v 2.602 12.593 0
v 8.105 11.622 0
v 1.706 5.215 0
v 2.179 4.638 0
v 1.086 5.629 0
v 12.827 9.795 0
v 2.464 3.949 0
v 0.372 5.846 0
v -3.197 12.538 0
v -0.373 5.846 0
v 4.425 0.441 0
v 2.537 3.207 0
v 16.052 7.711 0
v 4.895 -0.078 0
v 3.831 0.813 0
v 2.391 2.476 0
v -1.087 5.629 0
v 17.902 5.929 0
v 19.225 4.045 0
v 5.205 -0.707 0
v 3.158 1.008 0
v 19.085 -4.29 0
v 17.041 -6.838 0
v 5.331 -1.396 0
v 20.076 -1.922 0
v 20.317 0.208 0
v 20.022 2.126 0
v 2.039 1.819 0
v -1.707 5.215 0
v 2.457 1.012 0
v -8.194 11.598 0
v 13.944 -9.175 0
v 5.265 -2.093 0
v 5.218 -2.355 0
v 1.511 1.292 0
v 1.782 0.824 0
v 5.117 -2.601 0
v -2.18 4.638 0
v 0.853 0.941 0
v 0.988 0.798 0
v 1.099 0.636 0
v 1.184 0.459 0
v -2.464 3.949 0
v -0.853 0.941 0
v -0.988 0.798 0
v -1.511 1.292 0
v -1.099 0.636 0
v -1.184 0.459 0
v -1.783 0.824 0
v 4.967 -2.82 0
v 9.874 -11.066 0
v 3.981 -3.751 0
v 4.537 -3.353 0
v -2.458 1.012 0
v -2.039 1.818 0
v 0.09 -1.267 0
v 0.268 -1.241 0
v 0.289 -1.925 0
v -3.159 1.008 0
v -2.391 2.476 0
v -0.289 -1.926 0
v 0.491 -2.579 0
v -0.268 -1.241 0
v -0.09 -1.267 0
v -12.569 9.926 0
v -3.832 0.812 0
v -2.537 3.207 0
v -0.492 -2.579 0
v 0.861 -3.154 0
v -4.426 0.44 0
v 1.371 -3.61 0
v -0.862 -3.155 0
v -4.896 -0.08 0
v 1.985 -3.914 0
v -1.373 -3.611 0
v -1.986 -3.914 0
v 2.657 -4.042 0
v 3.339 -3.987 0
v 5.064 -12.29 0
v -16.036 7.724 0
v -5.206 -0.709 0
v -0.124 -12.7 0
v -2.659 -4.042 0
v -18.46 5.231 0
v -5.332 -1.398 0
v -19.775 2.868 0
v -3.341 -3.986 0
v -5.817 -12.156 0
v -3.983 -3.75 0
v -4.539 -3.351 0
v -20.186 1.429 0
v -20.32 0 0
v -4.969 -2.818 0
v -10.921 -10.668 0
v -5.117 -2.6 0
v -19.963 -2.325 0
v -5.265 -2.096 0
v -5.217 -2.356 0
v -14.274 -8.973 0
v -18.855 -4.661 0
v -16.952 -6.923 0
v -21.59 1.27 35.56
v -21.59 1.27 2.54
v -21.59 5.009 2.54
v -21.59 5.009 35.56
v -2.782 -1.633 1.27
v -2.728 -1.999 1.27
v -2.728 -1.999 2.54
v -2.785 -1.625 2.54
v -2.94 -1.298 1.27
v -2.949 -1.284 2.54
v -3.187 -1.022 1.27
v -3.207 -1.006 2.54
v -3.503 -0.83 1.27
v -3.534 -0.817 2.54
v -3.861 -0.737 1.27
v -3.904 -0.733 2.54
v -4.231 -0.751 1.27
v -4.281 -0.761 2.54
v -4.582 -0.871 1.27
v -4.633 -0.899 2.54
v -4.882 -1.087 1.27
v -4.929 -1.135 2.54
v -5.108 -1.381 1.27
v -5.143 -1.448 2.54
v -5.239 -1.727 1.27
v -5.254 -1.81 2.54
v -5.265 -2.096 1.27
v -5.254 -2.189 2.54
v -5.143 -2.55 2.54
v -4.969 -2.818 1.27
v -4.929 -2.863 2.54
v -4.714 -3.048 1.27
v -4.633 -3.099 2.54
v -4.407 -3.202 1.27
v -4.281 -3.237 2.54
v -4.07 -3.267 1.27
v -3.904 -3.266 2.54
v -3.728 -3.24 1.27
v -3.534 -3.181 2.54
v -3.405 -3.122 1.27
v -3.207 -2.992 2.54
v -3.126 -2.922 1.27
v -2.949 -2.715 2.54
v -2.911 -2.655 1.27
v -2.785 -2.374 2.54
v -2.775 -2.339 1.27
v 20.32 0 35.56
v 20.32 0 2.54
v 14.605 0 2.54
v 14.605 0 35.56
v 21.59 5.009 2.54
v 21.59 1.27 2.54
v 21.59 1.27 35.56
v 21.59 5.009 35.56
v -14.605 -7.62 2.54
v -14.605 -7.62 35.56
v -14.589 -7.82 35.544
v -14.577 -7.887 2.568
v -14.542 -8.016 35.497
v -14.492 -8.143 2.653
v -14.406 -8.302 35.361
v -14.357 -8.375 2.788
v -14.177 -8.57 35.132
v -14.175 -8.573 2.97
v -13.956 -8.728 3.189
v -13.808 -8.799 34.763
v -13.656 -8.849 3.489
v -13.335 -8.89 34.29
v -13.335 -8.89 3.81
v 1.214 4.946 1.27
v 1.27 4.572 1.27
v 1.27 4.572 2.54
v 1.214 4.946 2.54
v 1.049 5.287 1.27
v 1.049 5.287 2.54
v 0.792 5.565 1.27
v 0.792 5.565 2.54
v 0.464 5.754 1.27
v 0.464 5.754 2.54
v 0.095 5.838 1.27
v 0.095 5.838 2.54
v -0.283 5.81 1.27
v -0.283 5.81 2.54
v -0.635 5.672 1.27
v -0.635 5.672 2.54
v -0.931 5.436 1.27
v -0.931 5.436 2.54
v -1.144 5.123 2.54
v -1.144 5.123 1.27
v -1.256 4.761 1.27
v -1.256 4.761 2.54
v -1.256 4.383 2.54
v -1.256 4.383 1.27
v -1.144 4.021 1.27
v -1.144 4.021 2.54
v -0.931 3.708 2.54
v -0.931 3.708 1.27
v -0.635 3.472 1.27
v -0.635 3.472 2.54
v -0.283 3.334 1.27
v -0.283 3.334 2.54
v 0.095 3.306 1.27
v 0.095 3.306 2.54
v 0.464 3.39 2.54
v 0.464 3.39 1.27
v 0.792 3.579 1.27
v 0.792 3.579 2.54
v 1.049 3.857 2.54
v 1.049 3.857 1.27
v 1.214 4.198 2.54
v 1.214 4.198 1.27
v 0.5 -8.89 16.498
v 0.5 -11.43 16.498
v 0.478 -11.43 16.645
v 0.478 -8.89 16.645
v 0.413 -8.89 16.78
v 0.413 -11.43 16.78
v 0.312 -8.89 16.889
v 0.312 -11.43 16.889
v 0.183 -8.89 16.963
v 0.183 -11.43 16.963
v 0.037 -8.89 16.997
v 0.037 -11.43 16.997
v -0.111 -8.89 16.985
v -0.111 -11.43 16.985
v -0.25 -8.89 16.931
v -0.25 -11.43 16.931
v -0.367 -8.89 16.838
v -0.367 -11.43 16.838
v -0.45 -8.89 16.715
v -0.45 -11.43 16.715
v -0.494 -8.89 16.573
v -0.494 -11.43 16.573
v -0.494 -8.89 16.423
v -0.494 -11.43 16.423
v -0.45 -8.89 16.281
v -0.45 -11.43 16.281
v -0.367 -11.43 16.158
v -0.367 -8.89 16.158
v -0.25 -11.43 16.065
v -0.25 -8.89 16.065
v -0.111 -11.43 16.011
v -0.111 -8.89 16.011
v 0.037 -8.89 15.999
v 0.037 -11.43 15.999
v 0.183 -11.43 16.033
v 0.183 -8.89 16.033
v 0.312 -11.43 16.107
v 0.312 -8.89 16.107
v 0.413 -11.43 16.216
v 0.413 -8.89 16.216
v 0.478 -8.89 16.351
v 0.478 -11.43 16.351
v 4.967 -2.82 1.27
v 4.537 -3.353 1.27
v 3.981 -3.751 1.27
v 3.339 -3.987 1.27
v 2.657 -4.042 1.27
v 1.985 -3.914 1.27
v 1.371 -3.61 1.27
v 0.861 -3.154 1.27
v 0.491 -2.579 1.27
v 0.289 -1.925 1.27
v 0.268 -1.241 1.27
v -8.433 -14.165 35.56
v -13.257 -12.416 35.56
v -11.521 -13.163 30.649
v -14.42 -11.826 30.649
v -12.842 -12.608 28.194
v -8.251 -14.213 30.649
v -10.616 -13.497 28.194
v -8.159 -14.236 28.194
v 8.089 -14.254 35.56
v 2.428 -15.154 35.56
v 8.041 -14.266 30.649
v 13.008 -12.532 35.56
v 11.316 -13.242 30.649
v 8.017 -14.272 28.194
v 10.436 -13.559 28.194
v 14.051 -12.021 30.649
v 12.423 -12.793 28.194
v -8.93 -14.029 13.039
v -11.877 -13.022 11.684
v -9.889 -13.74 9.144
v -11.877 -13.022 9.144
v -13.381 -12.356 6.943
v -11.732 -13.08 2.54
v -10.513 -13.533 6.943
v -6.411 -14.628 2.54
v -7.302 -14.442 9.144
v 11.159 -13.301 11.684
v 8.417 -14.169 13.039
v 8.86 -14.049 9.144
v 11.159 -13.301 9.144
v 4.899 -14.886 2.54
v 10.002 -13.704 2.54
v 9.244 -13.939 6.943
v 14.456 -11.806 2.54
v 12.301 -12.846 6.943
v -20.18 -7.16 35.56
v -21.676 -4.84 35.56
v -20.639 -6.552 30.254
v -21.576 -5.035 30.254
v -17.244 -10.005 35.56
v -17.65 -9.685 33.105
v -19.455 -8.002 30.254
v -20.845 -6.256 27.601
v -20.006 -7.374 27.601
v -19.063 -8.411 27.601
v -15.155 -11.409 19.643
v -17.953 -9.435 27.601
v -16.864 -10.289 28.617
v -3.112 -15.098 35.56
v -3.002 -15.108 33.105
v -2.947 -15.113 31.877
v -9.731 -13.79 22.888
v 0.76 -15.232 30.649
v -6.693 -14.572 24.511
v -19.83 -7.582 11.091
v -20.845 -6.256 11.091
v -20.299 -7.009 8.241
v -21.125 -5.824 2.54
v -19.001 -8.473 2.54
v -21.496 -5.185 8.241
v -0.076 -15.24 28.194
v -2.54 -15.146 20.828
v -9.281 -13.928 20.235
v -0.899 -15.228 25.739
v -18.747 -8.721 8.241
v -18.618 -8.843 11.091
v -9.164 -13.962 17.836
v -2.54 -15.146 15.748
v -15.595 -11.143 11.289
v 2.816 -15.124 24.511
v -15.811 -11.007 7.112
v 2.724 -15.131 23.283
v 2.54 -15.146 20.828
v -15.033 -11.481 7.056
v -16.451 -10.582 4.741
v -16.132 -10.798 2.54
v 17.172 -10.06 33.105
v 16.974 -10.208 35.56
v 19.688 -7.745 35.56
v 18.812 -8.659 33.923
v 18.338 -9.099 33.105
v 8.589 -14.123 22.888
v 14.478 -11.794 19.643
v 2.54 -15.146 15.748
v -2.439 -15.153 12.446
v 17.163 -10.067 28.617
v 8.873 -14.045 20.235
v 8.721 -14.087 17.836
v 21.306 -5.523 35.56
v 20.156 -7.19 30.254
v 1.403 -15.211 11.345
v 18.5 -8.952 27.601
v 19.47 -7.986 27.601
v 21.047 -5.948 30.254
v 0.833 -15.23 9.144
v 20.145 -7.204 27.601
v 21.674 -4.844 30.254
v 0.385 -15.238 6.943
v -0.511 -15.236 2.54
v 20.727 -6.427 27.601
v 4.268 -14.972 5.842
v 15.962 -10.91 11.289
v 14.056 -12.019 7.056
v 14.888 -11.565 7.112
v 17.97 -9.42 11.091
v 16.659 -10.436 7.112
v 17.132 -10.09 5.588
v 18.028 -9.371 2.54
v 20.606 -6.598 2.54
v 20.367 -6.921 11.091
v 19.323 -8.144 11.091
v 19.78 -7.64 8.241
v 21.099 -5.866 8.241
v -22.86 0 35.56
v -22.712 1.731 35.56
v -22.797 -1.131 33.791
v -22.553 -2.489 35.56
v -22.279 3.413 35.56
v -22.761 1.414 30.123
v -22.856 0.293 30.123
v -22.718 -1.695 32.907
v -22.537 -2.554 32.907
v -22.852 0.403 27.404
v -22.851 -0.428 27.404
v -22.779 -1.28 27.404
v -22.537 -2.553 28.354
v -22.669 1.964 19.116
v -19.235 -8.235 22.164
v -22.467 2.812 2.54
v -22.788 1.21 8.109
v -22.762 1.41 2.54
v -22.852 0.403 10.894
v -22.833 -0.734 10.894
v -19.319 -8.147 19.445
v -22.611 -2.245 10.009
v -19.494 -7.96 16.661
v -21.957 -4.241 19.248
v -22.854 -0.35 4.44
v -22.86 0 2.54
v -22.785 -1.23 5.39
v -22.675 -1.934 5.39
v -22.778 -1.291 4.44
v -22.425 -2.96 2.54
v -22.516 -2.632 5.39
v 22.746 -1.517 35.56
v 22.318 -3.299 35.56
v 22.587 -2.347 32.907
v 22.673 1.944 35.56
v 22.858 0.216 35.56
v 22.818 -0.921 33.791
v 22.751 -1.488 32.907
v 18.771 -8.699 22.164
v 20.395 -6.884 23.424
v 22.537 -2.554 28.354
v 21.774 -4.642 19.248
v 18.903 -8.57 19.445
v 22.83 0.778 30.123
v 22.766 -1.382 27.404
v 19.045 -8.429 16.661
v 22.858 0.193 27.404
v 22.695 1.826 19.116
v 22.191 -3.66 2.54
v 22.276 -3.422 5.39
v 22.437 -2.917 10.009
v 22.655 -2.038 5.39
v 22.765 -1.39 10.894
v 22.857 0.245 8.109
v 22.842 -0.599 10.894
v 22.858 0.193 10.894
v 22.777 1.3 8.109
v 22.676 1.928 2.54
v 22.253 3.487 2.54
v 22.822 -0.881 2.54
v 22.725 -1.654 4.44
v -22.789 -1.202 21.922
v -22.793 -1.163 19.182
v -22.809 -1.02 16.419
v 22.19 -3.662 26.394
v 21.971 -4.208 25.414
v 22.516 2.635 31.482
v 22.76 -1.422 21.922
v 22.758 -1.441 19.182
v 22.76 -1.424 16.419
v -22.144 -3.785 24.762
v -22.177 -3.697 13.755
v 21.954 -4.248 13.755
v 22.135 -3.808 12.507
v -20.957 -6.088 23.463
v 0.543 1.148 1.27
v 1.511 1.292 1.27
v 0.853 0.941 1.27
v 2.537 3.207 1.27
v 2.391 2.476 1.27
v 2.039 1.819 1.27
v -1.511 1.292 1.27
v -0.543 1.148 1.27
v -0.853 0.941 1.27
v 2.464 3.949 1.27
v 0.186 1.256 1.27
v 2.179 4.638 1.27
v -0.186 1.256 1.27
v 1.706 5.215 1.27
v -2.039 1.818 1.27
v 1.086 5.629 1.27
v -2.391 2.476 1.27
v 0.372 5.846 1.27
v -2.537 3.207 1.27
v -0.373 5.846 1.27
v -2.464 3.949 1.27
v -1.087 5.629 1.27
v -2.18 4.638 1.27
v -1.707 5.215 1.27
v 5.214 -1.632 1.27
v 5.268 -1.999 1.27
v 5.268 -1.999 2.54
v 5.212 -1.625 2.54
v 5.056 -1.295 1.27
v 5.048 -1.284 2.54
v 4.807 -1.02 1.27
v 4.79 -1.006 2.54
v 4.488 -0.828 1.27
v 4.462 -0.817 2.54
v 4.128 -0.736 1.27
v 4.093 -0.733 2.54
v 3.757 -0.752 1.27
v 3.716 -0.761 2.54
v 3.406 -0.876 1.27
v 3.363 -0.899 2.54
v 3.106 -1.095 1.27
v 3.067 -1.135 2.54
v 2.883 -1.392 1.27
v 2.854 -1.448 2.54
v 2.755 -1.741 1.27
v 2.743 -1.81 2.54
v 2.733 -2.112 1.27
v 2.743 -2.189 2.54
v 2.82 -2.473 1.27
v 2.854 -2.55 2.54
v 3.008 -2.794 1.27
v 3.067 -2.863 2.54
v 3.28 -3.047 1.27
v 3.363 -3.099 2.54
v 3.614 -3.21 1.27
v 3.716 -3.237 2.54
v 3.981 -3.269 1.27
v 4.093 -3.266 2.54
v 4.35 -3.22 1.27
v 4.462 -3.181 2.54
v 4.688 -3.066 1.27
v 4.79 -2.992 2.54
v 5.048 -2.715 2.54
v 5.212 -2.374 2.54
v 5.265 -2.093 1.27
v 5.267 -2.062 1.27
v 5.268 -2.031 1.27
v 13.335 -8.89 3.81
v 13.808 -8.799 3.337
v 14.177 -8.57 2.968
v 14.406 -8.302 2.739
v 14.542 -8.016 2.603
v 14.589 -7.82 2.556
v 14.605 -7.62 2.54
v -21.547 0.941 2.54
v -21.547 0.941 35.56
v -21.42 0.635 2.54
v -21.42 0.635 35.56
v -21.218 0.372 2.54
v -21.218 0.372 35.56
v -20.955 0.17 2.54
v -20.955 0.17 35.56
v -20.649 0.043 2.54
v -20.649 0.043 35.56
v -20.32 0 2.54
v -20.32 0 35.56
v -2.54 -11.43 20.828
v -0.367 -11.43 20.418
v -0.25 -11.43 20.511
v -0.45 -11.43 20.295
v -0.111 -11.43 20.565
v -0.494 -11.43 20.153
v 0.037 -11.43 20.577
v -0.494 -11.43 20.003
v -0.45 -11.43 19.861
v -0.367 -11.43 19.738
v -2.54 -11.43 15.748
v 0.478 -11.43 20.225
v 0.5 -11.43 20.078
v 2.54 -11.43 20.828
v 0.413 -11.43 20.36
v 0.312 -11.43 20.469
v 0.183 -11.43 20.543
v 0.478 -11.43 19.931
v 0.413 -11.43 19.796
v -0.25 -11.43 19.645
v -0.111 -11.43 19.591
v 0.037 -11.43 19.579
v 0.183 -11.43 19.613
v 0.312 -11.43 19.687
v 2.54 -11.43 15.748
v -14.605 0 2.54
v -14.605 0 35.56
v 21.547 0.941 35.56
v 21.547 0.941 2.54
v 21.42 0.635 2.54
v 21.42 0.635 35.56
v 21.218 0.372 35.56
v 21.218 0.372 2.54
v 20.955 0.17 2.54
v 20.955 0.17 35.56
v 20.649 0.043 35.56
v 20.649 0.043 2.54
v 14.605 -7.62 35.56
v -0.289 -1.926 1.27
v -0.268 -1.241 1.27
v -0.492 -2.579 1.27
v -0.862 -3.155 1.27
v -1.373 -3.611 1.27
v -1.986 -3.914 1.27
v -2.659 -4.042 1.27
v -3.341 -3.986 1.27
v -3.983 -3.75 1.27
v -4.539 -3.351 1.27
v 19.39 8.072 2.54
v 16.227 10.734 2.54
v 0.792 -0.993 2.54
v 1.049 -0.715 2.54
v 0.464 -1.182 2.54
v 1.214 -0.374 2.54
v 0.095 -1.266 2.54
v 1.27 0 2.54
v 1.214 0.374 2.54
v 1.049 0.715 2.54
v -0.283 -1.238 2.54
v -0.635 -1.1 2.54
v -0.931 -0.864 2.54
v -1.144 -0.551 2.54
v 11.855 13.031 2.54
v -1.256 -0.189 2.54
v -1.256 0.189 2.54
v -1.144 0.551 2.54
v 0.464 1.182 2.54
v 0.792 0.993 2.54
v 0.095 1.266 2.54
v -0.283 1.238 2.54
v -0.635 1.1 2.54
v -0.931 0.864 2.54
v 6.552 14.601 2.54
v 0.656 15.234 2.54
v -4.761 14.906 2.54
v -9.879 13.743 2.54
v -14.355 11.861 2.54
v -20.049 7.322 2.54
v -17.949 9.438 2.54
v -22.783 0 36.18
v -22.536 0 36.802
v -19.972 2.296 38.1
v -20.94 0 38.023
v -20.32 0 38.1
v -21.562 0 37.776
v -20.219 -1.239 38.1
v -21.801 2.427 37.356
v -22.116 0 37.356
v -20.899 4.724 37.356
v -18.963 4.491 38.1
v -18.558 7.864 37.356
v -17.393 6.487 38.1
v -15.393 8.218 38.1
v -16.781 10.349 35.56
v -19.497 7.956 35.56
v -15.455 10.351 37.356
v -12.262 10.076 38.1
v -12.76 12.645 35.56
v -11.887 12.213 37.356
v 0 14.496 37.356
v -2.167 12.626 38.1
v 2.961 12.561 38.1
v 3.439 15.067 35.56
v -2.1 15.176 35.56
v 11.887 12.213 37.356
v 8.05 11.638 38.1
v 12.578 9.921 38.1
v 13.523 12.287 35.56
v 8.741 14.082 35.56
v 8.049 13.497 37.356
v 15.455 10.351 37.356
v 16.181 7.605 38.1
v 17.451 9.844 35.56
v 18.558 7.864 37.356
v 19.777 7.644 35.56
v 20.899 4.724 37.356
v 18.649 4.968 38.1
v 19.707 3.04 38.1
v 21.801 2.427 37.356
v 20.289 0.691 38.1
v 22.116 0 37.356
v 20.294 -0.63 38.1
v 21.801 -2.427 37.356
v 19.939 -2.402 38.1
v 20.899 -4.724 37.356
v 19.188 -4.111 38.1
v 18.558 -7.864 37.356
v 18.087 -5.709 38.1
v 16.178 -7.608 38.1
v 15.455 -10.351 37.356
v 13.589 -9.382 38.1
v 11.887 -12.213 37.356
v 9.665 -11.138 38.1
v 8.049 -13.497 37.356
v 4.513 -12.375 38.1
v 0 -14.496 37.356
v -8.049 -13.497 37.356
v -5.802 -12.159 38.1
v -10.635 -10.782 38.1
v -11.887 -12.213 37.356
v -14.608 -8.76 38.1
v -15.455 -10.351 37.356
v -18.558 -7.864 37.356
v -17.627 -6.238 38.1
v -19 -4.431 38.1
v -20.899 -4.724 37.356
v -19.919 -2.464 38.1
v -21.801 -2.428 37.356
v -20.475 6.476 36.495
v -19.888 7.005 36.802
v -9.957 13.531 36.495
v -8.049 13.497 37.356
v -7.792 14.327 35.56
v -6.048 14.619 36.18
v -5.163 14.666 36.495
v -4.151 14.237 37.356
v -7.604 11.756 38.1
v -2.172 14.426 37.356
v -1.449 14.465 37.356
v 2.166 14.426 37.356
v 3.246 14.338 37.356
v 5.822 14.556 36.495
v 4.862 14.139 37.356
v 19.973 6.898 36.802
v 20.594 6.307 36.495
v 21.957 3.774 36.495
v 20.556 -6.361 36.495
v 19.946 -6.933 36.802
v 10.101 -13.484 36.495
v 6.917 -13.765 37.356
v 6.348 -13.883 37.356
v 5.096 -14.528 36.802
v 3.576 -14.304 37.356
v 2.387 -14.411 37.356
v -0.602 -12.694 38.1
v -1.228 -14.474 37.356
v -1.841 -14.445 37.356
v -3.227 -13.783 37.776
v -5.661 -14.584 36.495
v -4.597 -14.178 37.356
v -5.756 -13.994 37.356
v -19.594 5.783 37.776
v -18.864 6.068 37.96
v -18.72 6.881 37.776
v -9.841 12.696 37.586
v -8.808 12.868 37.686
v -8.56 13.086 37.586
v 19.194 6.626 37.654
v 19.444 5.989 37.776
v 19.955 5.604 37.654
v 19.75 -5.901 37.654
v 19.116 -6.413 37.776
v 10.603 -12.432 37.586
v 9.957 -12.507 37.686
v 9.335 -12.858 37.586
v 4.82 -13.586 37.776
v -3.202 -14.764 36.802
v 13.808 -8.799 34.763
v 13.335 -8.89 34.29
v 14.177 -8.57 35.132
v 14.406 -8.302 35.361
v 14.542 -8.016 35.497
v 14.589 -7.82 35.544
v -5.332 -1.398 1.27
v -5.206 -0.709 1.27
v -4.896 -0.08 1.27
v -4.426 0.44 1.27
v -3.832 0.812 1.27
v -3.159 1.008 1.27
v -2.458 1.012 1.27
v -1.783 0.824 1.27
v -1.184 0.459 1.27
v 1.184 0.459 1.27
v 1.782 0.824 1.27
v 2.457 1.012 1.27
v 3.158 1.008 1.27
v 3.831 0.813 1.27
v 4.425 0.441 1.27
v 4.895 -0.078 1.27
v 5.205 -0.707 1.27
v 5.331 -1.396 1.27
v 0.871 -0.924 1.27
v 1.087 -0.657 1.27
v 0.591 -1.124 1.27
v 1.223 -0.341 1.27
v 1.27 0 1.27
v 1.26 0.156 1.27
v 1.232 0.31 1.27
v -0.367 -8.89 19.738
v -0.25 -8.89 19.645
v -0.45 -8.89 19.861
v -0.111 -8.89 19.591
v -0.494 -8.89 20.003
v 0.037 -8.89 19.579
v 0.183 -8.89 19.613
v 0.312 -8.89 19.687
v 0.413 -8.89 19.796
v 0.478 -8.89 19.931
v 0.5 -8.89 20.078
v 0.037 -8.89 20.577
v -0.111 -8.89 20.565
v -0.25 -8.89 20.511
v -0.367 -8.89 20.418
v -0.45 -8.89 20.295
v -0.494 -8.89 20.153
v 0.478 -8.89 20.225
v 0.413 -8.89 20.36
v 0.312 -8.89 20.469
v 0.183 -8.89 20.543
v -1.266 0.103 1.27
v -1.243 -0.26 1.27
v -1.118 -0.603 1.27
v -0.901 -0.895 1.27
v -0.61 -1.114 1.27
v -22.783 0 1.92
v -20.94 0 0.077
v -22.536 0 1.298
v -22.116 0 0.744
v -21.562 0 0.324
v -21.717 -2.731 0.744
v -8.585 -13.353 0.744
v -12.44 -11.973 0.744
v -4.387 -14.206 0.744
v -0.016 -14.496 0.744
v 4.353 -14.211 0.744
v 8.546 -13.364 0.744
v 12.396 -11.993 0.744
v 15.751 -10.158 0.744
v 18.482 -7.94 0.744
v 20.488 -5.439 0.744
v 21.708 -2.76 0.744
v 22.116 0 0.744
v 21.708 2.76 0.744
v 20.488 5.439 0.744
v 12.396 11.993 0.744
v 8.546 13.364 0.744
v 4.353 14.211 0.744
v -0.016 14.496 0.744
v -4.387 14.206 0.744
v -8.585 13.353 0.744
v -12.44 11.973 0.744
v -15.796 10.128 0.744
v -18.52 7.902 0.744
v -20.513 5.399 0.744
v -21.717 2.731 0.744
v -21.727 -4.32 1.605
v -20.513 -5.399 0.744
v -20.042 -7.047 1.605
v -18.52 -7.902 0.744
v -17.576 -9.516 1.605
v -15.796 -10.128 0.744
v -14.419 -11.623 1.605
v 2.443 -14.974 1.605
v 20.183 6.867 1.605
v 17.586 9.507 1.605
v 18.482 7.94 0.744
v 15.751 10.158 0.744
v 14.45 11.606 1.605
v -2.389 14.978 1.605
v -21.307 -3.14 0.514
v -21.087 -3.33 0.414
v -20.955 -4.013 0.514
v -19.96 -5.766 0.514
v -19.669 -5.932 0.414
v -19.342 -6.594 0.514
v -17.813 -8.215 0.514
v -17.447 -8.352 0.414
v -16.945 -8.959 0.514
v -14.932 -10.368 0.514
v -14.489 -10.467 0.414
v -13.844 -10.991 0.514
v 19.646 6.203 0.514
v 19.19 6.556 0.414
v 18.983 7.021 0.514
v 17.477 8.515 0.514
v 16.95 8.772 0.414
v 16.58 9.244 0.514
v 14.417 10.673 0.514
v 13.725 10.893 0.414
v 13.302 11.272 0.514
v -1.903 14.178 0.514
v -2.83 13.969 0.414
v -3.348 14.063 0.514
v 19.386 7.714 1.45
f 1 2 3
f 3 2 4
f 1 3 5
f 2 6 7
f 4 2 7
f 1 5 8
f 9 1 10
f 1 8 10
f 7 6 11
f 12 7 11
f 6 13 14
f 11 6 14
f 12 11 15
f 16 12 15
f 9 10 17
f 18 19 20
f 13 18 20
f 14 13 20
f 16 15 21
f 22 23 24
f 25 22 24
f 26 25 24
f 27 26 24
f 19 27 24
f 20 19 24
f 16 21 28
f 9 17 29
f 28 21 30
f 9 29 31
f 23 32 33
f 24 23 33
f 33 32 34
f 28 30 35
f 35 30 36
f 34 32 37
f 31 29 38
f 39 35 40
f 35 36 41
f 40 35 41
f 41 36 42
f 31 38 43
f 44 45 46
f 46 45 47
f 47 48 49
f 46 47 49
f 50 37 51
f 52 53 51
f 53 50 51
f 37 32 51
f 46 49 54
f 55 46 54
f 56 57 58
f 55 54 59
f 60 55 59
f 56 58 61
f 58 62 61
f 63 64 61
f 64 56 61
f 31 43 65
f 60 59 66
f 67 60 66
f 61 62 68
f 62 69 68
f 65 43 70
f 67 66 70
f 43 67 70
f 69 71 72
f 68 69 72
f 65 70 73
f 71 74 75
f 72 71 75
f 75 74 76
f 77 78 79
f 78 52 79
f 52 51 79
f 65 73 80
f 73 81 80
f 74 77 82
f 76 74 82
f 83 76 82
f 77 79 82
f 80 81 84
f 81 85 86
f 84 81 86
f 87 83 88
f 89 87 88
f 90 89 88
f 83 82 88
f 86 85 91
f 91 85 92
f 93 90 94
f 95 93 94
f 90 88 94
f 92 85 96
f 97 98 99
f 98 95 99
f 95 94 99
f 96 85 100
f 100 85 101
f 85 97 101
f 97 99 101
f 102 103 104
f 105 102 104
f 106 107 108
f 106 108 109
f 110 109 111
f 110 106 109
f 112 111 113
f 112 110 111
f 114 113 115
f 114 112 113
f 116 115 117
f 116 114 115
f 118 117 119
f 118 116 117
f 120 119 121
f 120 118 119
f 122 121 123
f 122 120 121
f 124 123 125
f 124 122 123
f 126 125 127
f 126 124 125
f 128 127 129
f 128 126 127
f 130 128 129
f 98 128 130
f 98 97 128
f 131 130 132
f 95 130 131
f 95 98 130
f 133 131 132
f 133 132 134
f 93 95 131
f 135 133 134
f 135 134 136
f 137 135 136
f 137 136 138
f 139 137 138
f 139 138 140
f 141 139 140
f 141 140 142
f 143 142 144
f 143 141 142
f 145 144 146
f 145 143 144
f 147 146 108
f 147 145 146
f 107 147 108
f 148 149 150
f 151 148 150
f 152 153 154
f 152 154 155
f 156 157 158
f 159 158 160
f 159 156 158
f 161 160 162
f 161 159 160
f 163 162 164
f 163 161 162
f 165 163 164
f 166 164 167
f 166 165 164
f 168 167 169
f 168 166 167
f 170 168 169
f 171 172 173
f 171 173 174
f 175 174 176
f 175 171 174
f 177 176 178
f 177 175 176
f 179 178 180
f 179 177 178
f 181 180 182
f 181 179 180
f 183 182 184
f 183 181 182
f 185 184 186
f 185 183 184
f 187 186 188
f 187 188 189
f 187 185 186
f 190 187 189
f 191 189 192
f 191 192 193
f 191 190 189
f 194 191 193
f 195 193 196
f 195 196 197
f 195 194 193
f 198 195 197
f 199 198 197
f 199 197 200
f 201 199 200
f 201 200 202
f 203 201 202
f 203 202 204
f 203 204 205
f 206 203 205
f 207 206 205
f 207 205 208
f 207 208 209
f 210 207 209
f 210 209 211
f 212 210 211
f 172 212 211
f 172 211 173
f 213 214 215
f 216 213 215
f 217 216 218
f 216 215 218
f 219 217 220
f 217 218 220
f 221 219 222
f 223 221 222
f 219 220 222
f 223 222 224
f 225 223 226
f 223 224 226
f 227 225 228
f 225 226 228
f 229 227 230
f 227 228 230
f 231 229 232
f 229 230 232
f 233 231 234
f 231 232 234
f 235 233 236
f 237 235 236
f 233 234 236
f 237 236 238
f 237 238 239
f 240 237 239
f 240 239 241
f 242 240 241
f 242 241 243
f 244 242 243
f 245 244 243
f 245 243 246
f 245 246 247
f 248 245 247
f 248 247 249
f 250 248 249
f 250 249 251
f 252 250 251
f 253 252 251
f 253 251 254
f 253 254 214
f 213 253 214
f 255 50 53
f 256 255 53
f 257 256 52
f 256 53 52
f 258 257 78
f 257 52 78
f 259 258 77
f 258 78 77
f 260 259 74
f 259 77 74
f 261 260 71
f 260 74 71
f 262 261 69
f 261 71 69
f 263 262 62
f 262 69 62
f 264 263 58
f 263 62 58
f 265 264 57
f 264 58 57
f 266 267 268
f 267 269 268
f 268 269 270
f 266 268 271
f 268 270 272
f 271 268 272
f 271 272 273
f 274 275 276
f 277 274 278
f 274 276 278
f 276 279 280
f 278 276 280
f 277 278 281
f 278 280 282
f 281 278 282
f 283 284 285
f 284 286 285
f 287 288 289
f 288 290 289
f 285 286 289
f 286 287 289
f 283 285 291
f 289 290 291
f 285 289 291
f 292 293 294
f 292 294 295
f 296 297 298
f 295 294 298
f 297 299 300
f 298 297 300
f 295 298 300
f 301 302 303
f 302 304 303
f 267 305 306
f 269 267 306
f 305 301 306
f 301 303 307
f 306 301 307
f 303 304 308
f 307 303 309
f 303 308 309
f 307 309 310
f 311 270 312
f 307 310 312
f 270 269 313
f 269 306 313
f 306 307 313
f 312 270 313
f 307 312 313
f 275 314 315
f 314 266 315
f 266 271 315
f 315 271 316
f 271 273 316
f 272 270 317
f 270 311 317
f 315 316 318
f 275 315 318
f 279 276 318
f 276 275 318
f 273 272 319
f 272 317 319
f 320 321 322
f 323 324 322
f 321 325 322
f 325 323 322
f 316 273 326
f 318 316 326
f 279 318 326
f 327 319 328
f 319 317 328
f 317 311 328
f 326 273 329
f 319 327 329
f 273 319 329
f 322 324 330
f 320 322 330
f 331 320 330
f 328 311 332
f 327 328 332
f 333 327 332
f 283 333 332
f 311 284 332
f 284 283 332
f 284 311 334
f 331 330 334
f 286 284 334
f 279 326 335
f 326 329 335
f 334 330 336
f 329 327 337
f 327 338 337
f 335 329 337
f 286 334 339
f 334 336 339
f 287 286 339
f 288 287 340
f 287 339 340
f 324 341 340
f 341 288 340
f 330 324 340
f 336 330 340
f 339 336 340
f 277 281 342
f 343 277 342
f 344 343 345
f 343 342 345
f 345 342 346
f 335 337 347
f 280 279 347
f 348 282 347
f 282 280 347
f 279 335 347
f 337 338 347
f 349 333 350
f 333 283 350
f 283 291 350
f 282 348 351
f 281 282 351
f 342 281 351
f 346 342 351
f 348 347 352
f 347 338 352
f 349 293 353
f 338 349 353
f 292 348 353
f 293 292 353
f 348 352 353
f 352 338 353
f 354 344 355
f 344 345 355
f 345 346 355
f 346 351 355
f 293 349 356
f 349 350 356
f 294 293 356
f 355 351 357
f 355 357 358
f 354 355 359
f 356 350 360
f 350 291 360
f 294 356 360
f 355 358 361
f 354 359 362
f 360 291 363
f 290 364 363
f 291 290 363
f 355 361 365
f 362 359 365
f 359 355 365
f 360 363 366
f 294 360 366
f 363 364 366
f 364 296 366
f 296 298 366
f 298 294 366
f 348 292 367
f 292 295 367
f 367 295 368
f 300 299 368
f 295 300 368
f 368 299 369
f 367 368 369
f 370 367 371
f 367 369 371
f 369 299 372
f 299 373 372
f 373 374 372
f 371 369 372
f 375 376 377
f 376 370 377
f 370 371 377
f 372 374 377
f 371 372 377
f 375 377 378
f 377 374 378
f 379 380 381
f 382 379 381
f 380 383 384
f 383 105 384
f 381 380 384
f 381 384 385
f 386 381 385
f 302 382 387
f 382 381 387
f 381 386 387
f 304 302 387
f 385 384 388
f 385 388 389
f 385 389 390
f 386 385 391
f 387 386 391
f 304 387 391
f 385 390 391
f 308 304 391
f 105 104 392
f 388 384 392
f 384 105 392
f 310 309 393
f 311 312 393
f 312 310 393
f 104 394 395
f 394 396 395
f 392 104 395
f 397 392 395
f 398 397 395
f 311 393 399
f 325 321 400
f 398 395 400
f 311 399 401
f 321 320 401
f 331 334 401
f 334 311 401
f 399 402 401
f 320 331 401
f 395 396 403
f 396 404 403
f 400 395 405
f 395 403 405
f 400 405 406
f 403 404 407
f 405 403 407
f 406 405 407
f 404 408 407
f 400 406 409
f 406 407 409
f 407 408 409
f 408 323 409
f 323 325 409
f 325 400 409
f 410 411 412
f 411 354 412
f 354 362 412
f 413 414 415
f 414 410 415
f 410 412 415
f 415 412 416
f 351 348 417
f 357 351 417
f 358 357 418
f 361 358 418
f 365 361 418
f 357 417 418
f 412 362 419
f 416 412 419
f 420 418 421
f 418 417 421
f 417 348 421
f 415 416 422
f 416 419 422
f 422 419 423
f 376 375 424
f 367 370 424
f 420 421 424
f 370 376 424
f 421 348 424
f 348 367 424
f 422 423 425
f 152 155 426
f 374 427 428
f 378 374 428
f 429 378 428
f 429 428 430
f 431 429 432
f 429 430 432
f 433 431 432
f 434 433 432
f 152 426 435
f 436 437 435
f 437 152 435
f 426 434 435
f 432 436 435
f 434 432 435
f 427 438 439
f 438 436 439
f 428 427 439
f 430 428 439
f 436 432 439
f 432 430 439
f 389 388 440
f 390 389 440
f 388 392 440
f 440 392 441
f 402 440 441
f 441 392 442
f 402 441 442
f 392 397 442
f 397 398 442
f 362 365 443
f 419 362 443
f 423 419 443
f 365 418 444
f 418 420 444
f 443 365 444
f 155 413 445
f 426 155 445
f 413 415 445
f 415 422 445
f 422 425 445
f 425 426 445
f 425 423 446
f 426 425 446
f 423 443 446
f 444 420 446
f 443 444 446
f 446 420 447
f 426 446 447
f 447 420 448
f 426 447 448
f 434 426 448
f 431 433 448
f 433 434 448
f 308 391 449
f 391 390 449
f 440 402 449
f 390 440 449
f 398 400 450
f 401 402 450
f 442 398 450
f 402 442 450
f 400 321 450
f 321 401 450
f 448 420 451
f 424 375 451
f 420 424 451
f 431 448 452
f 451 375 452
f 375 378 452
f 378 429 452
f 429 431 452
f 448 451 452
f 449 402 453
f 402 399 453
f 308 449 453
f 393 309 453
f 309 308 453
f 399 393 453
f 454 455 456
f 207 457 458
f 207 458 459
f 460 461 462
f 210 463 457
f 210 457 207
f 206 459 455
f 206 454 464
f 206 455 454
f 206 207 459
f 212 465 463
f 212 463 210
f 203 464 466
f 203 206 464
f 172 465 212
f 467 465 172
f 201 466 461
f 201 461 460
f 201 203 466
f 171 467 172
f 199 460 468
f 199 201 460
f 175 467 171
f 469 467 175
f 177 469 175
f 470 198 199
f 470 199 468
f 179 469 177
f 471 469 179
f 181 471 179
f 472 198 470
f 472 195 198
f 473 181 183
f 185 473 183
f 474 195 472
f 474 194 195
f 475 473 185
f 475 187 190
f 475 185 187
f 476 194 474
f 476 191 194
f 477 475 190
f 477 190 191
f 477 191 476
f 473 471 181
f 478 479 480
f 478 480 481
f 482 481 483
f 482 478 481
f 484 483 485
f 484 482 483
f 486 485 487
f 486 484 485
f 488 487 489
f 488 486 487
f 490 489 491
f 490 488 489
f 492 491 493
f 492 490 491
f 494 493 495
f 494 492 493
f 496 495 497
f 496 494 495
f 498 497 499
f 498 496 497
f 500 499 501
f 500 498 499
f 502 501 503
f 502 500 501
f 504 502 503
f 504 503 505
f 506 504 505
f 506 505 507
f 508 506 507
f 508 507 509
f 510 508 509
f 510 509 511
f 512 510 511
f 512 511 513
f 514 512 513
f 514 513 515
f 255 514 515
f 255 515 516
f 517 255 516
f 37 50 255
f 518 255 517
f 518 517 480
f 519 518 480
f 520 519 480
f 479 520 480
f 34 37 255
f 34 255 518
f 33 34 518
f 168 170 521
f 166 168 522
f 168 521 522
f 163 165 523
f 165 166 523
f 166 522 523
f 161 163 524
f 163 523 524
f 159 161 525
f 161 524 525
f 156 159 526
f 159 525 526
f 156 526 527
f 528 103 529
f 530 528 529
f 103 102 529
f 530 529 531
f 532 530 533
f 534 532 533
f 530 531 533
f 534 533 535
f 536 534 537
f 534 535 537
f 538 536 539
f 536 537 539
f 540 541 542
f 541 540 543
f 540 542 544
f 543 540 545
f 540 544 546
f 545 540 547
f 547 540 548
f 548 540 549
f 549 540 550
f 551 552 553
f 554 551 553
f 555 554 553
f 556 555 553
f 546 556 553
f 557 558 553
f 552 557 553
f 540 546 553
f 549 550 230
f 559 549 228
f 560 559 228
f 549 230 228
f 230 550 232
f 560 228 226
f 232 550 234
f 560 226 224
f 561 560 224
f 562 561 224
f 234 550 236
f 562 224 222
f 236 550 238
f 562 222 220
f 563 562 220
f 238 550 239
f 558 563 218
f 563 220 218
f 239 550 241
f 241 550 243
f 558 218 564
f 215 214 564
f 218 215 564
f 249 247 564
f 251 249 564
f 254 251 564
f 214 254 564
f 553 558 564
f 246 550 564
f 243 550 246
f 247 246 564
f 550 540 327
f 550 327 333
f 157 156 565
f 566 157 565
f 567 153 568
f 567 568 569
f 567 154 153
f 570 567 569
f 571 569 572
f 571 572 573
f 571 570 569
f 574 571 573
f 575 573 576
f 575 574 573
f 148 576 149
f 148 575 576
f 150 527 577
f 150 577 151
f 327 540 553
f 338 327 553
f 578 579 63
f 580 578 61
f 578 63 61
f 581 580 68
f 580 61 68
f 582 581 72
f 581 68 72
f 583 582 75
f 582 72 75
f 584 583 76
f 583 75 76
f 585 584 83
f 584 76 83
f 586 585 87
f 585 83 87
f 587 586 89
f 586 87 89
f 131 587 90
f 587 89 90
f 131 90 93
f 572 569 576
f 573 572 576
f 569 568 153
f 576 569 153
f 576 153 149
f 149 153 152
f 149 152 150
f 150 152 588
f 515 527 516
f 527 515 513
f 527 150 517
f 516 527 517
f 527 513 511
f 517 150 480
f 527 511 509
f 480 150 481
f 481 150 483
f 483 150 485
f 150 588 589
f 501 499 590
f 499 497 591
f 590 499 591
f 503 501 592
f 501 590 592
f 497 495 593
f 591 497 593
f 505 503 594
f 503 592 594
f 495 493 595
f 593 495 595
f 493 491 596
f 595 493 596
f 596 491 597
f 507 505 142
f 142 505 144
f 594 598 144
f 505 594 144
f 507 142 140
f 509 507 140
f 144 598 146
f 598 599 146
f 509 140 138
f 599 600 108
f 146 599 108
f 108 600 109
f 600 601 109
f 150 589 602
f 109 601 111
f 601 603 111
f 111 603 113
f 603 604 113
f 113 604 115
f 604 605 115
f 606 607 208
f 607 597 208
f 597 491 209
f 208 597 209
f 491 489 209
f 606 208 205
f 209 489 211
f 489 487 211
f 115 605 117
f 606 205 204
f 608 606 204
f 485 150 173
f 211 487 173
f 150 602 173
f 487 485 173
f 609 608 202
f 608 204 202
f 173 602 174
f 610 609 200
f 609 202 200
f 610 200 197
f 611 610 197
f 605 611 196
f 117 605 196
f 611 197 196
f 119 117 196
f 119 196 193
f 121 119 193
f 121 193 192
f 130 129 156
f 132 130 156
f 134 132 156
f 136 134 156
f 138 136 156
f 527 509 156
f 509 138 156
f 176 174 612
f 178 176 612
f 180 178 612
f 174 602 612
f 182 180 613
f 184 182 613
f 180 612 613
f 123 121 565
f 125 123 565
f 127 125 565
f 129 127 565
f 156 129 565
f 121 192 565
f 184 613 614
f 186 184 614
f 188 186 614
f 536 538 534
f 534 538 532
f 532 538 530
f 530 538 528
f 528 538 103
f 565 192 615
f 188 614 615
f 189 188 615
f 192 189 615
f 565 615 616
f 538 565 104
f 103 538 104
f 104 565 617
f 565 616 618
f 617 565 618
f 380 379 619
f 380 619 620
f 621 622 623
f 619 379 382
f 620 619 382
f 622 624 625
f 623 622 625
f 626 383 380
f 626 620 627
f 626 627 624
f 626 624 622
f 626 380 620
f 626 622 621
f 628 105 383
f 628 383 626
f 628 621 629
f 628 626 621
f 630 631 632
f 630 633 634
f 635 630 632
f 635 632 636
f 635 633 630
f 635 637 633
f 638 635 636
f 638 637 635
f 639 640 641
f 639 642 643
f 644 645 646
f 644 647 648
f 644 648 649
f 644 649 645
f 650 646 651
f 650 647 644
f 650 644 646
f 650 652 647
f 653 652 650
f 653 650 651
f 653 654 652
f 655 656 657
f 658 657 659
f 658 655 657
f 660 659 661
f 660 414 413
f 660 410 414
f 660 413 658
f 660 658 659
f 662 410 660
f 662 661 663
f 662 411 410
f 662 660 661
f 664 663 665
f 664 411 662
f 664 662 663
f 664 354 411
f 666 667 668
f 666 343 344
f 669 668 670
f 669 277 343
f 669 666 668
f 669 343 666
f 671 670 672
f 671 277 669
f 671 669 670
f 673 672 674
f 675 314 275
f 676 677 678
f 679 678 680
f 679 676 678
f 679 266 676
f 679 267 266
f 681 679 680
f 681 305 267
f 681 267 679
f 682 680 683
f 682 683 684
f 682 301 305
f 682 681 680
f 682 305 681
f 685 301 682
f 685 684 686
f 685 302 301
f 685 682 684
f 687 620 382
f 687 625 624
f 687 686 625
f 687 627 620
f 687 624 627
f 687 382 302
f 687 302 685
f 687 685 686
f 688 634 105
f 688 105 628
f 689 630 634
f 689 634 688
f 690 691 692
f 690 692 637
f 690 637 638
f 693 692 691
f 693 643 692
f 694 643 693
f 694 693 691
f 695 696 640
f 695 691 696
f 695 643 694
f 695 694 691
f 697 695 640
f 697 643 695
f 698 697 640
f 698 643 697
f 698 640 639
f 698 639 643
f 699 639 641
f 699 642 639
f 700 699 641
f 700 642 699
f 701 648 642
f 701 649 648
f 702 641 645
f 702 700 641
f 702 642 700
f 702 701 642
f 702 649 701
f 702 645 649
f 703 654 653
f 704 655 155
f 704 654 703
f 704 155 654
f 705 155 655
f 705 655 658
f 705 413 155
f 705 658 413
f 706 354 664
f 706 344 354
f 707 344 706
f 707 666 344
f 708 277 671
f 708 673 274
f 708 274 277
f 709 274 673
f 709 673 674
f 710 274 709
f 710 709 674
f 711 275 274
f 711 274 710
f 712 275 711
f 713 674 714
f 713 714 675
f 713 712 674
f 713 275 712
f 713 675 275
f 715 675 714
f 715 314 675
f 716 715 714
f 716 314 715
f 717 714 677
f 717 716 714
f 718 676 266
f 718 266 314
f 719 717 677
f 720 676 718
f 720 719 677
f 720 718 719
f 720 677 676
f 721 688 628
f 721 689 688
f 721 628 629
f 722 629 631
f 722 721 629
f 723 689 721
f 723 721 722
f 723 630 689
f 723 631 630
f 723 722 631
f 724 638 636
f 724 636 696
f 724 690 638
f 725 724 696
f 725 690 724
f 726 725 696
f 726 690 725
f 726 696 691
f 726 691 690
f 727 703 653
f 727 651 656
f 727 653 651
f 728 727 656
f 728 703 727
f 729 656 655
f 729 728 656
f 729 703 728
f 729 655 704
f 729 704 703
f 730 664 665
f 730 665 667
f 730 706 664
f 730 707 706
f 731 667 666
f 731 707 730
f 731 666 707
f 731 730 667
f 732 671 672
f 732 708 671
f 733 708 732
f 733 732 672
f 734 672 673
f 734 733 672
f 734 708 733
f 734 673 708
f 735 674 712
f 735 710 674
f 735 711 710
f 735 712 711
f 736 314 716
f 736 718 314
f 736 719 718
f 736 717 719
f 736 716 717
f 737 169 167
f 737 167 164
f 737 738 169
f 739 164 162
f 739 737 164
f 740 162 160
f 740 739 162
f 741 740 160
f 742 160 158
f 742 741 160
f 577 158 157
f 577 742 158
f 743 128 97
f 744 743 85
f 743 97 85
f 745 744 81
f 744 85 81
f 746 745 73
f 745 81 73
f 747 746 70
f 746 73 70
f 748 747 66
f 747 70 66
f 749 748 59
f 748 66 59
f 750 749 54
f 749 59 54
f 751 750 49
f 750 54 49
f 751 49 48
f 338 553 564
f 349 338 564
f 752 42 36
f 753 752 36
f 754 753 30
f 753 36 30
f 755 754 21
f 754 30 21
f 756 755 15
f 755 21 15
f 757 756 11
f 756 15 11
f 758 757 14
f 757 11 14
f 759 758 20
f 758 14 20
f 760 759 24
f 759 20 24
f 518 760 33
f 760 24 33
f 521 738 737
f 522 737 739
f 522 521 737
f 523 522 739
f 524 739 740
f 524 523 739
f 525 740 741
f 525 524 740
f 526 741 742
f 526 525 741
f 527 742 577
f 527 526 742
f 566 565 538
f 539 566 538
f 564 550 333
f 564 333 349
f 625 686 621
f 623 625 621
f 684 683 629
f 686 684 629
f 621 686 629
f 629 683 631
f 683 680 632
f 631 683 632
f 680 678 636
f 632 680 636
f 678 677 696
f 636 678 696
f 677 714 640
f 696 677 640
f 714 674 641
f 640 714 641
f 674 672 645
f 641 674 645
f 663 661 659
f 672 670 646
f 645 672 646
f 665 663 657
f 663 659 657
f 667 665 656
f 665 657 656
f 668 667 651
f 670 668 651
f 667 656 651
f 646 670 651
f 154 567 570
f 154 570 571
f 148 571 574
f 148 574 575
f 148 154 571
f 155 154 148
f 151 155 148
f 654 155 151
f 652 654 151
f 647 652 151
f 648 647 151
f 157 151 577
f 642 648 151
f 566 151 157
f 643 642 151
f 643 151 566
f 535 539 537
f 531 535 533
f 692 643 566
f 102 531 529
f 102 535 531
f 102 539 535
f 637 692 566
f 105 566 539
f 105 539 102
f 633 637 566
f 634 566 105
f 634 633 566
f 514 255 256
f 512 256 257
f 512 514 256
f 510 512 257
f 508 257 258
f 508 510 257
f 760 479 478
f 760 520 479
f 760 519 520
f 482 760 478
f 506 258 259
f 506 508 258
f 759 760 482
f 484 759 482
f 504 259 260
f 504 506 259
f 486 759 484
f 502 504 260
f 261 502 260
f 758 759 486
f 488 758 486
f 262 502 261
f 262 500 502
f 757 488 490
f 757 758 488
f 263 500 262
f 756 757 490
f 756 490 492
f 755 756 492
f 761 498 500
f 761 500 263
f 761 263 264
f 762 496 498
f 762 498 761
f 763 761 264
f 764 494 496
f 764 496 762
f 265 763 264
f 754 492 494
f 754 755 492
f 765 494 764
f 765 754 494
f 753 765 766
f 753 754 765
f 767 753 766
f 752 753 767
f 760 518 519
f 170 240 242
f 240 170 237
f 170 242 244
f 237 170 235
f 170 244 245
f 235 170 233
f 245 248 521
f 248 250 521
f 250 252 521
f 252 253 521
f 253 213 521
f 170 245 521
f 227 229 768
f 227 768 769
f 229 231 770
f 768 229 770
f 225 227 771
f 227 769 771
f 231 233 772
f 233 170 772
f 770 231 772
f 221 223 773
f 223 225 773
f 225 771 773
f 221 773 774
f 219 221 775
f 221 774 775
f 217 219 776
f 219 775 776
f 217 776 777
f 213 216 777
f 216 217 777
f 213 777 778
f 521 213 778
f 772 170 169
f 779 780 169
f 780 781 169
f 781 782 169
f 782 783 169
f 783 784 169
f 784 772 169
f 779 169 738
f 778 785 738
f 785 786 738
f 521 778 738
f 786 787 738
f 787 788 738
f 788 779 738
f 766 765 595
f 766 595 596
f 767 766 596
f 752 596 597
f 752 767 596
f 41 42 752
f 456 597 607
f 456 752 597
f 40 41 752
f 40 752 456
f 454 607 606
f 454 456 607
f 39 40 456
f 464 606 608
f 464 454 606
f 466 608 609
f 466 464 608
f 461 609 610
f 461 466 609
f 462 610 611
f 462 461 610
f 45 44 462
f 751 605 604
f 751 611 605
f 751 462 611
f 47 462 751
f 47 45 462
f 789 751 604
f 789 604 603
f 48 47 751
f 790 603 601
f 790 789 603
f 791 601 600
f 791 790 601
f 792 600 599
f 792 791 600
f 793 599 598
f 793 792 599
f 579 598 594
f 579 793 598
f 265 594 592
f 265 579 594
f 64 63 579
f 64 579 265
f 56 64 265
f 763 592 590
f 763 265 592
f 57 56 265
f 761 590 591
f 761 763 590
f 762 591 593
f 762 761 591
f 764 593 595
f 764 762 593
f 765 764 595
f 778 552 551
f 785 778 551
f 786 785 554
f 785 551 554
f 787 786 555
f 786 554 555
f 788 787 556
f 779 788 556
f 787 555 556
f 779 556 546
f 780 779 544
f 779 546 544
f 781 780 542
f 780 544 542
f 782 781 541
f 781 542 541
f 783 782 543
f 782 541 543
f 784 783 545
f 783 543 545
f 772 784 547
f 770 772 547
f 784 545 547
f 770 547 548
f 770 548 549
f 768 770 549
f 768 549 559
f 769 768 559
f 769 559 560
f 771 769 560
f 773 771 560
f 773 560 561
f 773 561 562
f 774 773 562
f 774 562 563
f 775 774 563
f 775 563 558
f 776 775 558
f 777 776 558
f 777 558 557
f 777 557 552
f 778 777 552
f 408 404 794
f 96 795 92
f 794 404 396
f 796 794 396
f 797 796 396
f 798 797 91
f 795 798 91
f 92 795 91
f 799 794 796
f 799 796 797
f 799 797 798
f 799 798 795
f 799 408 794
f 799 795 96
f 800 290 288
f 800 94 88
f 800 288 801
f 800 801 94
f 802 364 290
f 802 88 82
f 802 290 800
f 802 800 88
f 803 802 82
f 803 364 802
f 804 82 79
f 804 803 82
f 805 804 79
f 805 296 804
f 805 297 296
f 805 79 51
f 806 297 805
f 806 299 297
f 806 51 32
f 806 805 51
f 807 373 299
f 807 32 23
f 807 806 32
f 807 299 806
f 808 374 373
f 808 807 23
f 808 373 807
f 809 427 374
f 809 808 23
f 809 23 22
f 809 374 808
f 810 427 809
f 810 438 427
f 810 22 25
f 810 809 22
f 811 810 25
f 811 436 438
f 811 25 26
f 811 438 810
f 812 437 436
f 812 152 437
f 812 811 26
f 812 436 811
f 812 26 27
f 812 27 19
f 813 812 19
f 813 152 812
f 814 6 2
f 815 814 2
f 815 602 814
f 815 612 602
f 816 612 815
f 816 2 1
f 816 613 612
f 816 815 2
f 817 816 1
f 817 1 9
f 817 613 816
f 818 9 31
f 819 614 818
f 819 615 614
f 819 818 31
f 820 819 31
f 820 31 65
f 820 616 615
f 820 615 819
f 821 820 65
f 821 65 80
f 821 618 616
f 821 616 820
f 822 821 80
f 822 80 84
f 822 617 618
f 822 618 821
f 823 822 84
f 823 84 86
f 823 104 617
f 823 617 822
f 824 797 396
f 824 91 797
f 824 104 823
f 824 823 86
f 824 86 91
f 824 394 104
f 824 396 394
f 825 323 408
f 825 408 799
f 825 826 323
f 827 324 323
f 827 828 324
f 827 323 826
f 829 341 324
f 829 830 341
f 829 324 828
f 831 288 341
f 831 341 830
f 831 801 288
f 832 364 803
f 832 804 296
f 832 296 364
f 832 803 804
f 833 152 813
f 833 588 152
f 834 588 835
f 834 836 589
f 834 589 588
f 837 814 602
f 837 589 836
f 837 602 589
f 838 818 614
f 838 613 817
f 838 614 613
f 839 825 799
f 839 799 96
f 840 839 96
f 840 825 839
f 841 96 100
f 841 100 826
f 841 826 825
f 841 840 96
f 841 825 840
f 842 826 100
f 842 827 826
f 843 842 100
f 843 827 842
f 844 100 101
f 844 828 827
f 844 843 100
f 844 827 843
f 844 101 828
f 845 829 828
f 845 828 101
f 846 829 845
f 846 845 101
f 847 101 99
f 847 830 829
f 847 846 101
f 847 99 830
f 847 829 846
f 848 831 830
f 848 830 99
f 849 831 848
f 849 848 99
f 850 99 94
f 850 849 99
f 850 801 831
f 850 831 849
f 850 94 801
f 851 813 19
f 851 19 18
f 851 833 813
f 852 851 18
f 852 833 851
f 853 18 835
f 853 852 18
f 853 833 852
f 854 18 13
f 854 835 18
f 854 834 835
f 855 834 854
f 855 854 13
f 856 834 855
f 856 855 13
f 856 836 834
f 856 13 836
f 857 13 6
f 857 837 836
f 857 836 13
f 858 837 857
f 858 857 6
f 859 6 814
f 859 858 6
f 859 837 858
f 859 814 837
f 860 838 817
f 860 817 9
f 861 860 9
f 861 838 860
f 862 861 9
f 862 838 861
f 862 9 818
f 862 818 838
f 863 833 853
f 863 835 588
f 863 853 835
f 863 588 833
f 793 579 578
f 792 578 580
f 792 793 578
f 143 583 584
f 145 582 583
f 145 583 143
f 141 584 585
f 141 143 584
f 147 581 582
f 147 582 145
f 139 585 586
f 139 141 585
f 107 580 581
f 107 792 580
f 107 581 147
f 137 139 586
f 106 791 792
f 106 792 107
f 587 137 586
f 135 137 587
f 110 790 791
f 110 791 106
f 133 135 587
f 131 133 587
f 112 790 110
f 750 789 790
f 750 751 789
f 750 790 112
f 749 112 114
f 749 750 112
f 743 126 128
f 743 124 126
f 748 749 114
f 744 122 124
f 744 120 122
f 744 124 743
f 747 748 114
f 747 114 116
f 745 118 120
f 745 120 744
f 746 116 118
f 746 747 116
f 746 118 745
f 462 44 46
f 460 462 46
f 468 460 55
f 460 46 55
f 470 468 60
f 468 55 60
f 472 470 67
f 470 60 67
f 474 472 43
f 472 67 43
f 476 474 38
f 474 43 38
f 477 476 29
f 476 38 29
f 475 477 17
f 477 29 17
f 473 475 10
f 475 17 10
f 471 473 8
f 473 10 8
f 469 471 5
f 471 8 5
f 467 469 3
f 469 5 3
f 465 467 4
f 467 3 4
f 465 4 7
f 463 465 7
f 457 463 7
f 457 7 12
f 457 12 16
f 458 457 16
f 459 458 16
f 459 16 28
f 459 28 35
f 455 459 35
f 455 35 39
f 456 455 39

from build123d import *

# Parameters (mm, degrees)
SKETCH1_RX               = 22.86
SKETCH1_RY               = 15.24
BOSS_EXTRUDE4_DEPTH      = 45.72
CUT_EXTRUDE2_START       = -10.16
SKETCH4_W                = 29.21
SKETCH4_H                = 17.78
CUT_EXTRUDE2_DEPTH       = 33.02
SKETCH7_W                = 14.643913221
SKETCH7_H                = 35.56
CUT_EXTRUDE4_DEPTH       = 33.02
CUT_EXTRUDE4_DEPTH_BACK  = 33.02
SKETCH8_R                = 1.27
CUT_EXTRUDE5_DEPTH       = 2.54
FILLET1_R                = 2.54
FILLET2_R                = 2.54
CUT_EXTRUDE11_START      = -2.54
SKETCH12_W               = 43.18
SKETCH12_H               = 19.05
CUT_EXTRUDE11_DEPTH      = 33.02
FILLET3_R                = 1.27
CUT_EXTRUDE13_START      = -2.54
SKETCH13_W               = 5.08
SKETCH13_H               = 5.08
CUT_EXTRUDE13_DEPTH      = 4.8100001
SKETCH14_R               = 0.5
CUT_EXTRUDE14_DEPTH      = 4.8100001
CUT_EXTRUDE14_DEPTH_BACK = 27.6700001
SKETCH16_R               = 2.54
CUT_EXTRUDE15_DEPTH      = 1.27
FILLET4_R                = 1.27


with BuildPart() as part:
    # Sketch1 → Boss-Extrude4 (new body)
    with BuildSketch(Plane.XY):
        with Locations(Location((0, 0), (0, 0, 180))):
            Ellipse(SKETCH1_RX, SKETCH1_RY)
    extrude(amount=BOSS_EXTRUDE4_DEPTH)

    # Sketch4 → Cut-Extrude2 (cut)
    with BuildSketch(Plane.XY.offset(45.72).offset(CUT_EXTRUDE2_START)):
        Rectangle(SKETCH4_W, SKETCH4_H)
    extrude(amount=-CUT_EXTRUDE2_DEPTH, mode=Mode.SUBTRACT)

    # Sketch7 → Cut-Extrude4 (cut, two sides)
    with BuildSketch(Plane(origin=(0, 0, 0), x_dir=(0, 0, -1), z_dir=(1, 0, 0))) as cut_extrude4_sk:
        with Locations((-45.421956611, -1.677648267)):
            Rectangle(SKETCH7_W, SKETCH7_H)
    extrude(amount=CUT_EXTRUDE4_DEPTH, mode=Mode.SUBTRACT)
    extrude(cut_extrude4_sk.sketch, amount=-CUT_EXTRUDE4_DEPTH_BACK, mode=Mode.SUBTRACT)

    # Sketch8 → Cut-Extrude5 (cut)
    with BuildSketch(Plane.XY):
        Circle(SKETCH8_R)
        with Locations((3.998447315, -1.999223657)):
            Circle(SKETCH8_R)
        with Locations((-3.998447315, -1.999223657)):
            Circle(SKETCH8_R)
        with Locations((0, 4.572)):
            Circle(SKETCH8_R)
    extrude(amount=CUT_EXTRUDE5_DEPTH, mode=Mode.SUBTRACT)

    # Fillet1
    fillet1_edges = [part.edges().sort_by_distance(p)[0] for p in [
        (22.859987041, 0.016227247, 0),
    ]]
    fillet(fillet1_edges, radius=FILLET1_R)

    # Fillet2
    fillet2_edges = [part.edges().sort_by_distance(p)[0] for p in [
        (22.860000074, 1.7e-08, 38.1),
    ]]
    fillet(fillet2_edges, radius=FILLET2_R)

    # Sketch12 → Cut-Extrude11 (cut)
    with BuildSketch(Plane(origin=(0, 0, 0), x_dir=(-1, 0, 0), z_dir=(0, 0, -1)).offset(CUT_EXTRUDE11_START)):
        with Locations((0, 9.525)):
            Rectangle(SKETCH12_W, SKETCH12_H)
    extrude(amount=-CUT_EXTRUDE11_DEPTH, mode=Mode.SUBTRACT)

    # Fillet3
    fillet3_edges = [part.edges().sort_by_distance(p)[0] for p in [
        (14.605, -8.89, 19.05),
        (0, -8.89, 35.56),
        (-14.605, -8.89, 19.05),
        (0, -8.89, 2.54),
    ]]
    fillet(fillet3_edges, radius=FILLET3_R)

    # Sketch13 → Cut-Extrude13 (cut, through all)
    with BuildSketch(Plane(origin=(0, -8.89, 0), x_dir=(1, 0, 0), z_dir=(0, 1, 0)).offset(CUT_EXTRUDE13_START)):
        with Locations((0, -18.288)):
            Rectangle(SKETCH13_W, SKETCH13_H)
    extrude(amount=-CUT_EXTRUDE13_DEPTH, mode=Mode.SUBTRACT)

    # Sketch14 → Cut-Extrude14 (cut, two sides)
    with BuildSketch(Plane.XZ.offset(11.43)) as cut_extrude14_sk:
        with Locations((0, 20.077999976)):
            Circle(SKETCH14_R)
        with Locations((0, 16.498)):
            Circle(SKETCH14_R)
    extrude(amount=CUT_EXTRUDE14_DEPTH, mode=Mode.SUBTRACT)
    extrude(cut_extrude14_sk.sketch, amount=-CUT_EXTRUDE14_DEPTH_BACK, mode=Mode.SUBTRACT)

    # Sketch16 → Cut-Extrude15 (cut)
    with BuildSketch(Plane(origin=(0, 0, 0), x_dir=(-1, 0, 0), z_dir=(0, 0, -1))):
        with Locations((2.7942426, -1.505997915)):
            Circle(SKETCH16_R)
        with Locations((0.000242604, 3.333352043)):
            Circle(SKETCH16_R)
        with Locations((-2.793757393, -1.505997915)):
            Circle(SKETCH16_R)
    extrude(amount=-CUT_EXTRUDE15_DEPTH, mode=Mode.SUBTRACT)

    # Fillet4
    fillet4_edges = [part.edges().sort_by_distance(p)[0] for p in [
        (-21.59, 0, 19.05),
        (21.59, 0, 19.05),
    ]]
    fillet(fillet4_edges, radius=FILLET4_R)


solid = part.part
